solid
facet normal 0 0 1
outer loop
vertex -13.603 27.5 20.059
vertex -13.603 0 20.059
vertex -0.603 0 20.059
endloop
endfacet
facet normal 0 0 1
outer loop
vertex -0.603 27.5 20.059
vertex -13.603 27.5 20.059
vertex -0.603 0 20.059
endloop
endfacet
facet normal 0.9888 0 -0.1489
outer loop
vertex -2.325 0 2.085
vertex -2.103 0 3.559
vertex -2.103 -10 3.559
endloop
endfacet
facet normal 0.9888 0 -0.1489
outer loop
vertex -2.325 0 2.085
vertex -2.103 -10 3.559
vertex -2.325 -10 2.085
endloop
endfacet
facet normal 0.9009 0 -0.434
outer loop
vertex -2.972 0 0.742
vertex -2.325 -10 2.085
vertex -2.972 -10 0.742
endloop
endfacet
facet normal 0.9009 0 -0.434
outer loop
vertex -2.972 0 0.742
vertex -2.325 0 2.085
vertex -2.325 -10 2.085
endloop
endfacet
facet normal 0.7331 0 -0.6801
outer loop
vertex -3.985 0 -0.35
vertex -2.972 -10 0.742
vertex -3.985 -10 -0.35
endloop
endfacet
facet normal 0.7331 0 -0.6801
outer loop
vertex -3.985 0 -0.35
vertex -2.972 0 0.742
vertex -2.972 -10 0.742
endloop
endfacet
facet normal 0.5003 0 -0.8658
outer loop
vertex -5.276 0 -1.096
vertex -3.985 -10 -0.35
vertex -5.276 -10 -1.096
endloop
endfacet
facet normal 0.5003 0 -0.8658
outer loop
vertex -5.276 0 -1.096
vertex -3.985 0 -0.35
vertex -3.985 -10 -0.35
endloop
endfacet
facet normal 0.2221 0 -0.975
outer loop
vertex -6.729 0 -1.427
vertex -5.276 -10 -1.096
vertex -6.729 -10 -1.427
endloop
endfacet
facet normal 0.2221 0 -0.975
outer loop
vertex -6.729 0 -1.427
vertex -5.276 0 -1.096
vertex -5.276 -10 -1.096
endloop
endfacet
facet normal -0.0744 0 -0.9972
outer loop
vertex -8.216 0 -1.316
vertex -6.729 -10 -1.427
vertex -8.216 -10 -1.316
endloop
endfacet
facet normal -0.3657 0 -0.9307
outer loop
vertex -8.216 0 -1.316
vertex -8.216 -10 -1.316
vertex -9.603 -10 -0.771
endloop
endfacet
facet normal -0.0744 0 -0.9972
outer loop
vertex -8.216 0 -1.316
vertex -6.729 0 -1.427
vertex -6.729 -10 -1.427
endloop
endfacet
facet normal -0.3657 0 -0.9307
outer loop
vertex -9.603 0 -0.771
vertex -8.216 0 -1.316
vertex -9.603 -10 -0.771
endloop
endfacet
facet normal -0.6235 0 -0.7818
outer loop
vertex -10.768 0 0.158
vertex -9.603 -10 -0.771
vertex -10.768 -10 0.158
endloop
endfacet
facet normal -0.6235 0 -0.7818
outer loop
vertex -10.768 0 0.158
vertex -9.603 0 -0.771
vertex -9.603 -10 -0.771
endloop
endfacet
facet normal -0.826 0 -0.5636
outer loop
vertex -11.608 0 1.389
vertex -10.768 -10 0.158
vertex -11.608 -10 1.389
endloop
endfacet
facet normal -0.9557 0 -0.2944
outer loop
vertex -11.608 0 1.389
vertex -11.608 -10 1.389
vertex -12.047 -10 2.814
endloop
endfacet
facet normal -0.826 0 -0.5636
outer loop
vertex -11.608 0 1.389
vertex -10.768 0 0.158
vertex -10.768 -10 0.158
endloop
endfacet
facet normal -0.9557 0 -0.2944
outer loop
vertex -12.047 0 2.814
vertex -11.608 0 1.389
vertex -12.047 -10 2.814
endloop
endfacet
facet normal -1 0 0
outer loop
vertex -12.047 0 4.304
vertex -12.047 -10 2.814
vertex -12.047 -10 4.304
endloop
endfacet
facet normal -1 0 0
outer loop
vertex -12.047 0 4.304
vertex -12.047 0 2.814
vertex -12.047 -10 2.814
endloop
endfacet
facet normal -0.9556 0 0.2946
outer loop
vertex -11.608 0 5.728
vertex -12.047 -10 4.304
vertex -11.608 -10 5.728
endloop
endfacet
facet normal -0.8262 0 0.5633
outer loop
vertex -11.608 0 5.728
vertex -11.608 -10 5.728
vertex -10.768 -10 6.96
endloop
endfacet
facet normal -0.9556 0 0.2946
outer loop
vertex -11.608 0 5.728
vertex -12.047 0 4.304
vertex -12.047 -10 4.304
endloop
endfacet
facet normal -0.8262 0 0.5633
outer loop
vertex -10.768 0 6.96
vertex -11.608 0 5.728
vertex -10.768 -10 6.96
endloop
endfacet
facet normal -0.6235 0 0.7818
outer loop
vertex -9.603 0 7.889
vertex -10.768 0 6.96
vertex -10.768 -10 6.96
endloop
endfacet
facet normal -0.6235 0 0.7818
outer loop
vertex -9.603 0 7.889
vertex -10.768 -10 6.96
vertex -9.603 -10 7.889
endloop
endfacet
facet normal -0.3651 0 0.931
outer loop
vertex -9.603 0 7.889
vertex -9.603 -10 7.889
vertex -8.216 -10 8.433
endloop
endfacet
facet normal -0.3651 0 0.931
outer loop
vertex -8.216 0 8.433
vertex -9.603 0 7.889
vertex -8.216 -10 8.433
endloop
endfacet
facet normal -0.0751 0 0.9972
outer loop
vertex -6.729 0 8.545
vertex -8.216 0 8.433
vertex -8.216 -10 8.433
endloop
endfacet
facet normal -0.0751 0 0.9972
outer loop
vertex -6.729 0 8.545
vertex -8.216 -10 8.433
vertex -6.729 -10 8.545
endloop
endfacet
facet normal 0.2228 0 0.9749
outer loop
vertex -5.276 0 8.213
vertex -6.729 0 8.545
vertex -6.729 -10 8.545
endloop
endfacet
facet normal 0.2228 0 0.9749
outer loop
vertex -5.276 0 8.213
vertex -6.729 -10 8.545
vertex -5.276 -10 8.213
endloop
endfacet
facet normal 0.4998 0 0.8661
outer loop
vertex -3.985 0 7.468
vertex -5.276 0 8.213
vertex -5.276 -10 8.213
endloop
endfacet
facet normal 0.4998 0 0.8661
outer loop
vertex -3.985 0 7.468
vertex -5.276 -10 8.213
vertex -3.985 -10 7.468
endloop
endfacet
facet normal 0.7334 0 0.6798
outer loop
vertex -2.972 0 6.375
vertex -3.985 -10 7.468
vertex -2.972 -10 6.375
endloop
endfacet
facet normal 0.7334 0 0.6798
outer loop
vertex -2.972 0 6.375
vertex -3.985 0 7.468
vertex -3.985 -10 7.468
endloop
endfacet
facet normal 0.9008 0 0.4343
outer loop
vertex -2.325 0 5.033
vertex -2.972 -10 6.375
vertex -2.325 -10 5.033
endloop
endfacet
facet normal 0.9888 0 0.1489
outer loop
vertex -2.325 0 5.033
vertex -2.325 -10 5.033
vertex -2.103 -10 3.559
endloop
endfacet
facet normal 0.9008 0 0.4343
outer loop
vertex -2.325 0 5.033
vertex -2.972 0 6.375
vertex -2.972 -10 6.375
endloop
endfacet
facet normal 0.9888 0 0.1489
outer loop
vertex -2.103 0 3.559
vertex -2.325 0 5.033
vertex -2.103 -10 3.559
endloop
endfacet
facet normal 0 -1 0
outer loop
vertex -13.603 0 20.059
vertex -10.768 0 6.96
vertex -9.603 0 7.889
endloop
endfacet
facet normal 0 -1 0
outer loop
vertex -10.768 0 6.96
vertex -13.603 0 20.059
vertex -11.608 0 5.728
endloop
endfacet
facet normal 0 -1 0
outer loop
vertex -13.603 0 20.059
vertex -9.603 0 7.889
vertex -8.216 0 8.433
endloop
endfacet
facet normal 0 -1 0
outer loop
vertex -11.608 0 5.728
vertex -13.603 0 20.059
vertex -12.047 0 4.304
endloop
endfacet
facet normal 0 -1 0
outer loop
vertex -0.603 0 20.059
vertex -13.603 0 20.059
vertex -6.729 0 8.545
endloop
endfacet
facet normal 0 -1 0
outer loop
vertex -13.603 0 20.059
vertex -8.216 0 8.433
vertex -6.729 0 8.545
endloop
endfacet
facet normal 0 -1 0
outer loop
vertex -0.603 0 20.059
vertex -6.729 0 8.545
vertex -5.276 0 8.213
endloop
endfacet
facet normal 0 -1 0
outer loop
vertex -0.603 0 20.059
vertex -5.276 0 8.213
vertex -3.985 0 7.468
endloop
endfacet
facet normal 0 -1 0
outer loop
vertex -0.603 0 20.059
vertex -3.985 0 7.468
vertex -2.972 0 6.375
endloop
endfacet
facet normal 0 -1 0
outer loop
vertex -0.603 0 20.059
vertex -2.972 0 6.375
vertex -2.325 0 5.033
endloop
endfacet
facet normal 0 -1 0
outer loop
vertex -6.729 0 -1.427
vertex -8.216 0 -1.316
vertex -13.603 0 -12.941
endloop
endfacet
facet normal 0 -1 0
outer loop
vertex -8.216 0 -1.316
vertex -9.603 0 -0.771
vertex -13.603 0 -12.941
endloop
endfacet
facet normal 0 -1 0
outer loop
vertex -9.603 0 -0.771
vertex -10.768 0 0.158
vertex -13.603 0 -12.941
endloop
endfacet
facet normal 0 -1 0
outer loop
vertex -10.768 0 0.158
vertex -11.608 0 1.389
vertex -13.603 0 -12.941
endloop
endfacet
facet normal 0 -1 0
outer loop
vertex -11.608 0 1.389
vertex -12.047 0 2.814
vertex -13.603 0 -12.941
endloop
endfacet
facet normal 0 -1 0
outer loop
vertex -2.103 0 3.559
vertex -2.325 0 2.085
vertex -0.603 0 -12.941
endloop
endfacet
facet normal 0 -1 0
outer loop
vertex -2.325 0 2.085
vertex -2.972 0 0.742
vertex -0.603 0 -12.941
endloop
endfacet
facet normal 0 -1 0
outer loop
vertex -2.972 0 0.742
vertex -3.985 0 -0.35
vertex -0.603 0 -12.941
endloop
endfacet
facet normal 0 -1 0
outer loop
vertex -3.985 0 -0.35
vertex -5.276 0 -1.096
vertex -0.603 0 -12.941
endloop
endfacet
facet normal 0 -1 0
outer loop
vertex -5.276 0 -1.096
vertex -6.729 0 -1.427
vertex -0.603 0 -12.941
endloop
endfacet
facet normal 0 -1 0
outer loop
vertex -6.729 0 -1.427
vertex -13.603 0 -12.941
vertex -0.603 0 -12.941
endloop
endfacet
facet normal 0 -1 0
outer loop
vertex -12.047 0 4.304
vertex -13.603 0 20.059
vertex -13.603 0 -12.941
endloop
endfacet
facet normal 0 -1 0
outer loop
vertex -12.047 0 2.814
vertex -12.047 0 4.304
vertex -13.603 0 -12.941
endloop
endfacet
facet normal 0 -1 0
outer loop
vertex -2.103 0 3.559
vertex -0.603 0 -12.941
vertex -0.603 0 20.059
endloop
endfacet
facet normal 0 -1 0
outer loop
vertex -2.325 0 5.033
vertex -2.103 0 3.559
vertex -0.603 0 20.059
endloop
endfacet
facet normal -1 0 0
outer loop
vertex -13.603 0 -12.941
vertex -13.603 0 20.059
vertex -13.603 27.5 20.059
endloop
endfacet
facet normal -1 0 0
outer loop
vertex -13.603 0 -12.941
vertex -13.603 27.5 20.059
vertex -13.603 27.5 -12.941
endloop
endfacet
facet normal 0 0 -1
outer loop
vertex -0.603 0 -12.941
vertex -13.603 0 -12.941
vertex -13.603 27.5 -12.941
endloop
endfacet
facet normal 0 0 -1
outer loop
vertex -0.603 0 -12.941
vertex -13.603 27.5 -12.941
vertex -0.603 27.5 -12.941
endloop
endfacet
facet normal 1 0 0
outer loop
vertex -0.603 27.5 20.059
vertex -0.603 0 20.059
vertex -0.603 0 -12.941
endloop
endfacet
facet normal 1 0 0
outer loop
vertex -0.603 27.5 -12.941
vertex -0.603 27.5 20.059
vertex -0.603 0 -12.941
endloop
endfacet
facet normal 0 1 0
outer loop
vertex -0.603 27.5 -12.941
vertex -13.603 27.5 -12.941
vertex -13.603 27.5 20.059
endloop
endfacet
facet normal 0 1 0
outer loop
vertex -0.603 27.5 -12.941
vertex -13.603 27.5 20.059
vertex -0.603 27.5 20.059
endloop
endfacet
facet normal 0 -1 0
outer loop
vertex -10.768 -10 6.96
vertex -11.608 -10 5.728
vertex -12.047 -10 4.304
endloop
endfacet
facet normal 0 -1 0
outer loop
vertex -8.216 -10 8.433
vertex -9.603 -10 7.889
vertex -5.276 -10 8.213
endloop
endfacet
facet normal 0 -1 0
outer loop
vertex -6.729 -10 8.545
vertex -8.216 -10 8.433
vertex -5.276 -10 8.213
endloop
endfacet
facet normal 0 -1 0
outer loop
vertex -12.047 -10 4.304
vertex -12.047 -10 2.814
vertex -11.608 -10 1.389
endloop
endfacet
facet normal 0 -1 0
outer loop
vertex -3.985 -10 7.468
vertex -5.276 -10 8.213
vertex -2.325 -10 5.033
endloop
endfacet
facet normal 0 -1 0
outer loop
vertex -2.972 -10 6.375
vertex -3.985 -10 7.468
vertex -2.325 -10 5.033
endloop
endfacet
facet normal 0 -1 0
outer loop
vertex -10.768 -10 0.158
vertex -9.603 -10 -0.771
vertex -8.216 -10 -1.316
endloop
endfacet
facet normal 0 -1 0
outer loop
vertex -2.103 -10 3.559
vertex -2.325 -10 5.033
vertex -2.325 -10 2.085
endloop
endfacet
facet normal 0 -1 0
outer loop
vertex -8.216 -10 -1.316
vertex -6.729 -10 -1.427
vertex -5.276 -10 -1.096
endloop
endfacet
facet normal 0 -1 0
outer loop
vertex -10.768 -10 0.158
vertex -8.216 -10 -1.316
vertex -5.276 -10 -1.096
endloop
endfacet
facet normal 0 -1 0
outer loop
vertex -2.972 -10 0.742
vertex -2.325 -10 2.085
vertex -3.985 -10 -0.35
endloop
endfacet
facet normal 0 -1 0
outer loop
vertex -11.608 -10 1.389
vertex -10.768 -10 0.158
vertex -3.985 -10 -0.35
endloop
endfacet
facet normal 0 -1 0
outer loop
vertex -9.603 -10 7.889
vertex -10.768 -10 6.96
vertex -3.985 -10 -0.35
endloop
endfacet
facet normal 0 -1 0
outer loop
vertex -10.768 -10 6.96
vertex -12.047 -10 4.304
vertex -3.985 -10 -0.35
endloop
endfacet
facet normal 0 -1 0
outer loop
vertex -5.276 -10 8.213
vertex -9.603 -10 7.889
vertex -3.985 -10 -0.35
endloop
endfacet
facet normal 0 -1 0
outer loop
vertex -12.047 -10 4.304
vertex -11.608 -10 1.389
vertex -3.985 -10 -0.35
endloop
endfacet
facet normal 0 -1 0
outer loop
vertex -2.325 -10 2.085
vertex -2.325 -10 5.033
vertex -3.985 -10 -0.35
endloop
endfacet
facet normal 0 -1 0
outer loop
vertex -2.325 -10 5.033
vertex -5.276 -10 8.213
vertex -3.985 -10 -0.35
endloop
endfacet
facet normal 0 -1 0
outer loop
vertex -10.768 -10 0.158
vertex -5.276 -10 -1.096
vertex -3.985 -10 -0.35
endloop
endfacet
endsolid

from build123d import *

# Parameters (mm, degrees)
SKIZZE1_W                       = 13
SKIZZE1_H                       = 33
AUFSATZ_LINEAR_AUSTRAGEN1_DEPTH = 27.5
SKIZZE2_R                       = 5
AUFSATZ_LINEAR_AUSTRAGEN2_DEPTH = 10


with BuildPart() as part:
    # Skizze1 → Aufsatz-Linear austragen1 (new body)
    with BuildSketch(Plane(origin=(0, 0, 0), x_dir=(1, 0, 0), z_dir=(0, 1, 0))):
        with Locations((-7.102941176, -3.558823529)):
            Rectangle(SKIZZE1_W, SKIZZE1_H)
    extrude(amount=AUFSATZ_LINEAR_AUSTRAGEN1_DEPTH)

    # Skizze2 → Aufsatz-Linear austragen2 (add)
    with BuildSketch(Plane(origin=(0, 0, 0), x_dir=(1, 0, 0), z_dir=(0, 1, 0))):
        with Locations((-7.102941176, -3.558823529)):
            Circle(SKIZZE2_R)
    extrude(amount=-AUFSATZ_LINEAR_AUSTRAGEN2_DEPTH)


solid = part.part
